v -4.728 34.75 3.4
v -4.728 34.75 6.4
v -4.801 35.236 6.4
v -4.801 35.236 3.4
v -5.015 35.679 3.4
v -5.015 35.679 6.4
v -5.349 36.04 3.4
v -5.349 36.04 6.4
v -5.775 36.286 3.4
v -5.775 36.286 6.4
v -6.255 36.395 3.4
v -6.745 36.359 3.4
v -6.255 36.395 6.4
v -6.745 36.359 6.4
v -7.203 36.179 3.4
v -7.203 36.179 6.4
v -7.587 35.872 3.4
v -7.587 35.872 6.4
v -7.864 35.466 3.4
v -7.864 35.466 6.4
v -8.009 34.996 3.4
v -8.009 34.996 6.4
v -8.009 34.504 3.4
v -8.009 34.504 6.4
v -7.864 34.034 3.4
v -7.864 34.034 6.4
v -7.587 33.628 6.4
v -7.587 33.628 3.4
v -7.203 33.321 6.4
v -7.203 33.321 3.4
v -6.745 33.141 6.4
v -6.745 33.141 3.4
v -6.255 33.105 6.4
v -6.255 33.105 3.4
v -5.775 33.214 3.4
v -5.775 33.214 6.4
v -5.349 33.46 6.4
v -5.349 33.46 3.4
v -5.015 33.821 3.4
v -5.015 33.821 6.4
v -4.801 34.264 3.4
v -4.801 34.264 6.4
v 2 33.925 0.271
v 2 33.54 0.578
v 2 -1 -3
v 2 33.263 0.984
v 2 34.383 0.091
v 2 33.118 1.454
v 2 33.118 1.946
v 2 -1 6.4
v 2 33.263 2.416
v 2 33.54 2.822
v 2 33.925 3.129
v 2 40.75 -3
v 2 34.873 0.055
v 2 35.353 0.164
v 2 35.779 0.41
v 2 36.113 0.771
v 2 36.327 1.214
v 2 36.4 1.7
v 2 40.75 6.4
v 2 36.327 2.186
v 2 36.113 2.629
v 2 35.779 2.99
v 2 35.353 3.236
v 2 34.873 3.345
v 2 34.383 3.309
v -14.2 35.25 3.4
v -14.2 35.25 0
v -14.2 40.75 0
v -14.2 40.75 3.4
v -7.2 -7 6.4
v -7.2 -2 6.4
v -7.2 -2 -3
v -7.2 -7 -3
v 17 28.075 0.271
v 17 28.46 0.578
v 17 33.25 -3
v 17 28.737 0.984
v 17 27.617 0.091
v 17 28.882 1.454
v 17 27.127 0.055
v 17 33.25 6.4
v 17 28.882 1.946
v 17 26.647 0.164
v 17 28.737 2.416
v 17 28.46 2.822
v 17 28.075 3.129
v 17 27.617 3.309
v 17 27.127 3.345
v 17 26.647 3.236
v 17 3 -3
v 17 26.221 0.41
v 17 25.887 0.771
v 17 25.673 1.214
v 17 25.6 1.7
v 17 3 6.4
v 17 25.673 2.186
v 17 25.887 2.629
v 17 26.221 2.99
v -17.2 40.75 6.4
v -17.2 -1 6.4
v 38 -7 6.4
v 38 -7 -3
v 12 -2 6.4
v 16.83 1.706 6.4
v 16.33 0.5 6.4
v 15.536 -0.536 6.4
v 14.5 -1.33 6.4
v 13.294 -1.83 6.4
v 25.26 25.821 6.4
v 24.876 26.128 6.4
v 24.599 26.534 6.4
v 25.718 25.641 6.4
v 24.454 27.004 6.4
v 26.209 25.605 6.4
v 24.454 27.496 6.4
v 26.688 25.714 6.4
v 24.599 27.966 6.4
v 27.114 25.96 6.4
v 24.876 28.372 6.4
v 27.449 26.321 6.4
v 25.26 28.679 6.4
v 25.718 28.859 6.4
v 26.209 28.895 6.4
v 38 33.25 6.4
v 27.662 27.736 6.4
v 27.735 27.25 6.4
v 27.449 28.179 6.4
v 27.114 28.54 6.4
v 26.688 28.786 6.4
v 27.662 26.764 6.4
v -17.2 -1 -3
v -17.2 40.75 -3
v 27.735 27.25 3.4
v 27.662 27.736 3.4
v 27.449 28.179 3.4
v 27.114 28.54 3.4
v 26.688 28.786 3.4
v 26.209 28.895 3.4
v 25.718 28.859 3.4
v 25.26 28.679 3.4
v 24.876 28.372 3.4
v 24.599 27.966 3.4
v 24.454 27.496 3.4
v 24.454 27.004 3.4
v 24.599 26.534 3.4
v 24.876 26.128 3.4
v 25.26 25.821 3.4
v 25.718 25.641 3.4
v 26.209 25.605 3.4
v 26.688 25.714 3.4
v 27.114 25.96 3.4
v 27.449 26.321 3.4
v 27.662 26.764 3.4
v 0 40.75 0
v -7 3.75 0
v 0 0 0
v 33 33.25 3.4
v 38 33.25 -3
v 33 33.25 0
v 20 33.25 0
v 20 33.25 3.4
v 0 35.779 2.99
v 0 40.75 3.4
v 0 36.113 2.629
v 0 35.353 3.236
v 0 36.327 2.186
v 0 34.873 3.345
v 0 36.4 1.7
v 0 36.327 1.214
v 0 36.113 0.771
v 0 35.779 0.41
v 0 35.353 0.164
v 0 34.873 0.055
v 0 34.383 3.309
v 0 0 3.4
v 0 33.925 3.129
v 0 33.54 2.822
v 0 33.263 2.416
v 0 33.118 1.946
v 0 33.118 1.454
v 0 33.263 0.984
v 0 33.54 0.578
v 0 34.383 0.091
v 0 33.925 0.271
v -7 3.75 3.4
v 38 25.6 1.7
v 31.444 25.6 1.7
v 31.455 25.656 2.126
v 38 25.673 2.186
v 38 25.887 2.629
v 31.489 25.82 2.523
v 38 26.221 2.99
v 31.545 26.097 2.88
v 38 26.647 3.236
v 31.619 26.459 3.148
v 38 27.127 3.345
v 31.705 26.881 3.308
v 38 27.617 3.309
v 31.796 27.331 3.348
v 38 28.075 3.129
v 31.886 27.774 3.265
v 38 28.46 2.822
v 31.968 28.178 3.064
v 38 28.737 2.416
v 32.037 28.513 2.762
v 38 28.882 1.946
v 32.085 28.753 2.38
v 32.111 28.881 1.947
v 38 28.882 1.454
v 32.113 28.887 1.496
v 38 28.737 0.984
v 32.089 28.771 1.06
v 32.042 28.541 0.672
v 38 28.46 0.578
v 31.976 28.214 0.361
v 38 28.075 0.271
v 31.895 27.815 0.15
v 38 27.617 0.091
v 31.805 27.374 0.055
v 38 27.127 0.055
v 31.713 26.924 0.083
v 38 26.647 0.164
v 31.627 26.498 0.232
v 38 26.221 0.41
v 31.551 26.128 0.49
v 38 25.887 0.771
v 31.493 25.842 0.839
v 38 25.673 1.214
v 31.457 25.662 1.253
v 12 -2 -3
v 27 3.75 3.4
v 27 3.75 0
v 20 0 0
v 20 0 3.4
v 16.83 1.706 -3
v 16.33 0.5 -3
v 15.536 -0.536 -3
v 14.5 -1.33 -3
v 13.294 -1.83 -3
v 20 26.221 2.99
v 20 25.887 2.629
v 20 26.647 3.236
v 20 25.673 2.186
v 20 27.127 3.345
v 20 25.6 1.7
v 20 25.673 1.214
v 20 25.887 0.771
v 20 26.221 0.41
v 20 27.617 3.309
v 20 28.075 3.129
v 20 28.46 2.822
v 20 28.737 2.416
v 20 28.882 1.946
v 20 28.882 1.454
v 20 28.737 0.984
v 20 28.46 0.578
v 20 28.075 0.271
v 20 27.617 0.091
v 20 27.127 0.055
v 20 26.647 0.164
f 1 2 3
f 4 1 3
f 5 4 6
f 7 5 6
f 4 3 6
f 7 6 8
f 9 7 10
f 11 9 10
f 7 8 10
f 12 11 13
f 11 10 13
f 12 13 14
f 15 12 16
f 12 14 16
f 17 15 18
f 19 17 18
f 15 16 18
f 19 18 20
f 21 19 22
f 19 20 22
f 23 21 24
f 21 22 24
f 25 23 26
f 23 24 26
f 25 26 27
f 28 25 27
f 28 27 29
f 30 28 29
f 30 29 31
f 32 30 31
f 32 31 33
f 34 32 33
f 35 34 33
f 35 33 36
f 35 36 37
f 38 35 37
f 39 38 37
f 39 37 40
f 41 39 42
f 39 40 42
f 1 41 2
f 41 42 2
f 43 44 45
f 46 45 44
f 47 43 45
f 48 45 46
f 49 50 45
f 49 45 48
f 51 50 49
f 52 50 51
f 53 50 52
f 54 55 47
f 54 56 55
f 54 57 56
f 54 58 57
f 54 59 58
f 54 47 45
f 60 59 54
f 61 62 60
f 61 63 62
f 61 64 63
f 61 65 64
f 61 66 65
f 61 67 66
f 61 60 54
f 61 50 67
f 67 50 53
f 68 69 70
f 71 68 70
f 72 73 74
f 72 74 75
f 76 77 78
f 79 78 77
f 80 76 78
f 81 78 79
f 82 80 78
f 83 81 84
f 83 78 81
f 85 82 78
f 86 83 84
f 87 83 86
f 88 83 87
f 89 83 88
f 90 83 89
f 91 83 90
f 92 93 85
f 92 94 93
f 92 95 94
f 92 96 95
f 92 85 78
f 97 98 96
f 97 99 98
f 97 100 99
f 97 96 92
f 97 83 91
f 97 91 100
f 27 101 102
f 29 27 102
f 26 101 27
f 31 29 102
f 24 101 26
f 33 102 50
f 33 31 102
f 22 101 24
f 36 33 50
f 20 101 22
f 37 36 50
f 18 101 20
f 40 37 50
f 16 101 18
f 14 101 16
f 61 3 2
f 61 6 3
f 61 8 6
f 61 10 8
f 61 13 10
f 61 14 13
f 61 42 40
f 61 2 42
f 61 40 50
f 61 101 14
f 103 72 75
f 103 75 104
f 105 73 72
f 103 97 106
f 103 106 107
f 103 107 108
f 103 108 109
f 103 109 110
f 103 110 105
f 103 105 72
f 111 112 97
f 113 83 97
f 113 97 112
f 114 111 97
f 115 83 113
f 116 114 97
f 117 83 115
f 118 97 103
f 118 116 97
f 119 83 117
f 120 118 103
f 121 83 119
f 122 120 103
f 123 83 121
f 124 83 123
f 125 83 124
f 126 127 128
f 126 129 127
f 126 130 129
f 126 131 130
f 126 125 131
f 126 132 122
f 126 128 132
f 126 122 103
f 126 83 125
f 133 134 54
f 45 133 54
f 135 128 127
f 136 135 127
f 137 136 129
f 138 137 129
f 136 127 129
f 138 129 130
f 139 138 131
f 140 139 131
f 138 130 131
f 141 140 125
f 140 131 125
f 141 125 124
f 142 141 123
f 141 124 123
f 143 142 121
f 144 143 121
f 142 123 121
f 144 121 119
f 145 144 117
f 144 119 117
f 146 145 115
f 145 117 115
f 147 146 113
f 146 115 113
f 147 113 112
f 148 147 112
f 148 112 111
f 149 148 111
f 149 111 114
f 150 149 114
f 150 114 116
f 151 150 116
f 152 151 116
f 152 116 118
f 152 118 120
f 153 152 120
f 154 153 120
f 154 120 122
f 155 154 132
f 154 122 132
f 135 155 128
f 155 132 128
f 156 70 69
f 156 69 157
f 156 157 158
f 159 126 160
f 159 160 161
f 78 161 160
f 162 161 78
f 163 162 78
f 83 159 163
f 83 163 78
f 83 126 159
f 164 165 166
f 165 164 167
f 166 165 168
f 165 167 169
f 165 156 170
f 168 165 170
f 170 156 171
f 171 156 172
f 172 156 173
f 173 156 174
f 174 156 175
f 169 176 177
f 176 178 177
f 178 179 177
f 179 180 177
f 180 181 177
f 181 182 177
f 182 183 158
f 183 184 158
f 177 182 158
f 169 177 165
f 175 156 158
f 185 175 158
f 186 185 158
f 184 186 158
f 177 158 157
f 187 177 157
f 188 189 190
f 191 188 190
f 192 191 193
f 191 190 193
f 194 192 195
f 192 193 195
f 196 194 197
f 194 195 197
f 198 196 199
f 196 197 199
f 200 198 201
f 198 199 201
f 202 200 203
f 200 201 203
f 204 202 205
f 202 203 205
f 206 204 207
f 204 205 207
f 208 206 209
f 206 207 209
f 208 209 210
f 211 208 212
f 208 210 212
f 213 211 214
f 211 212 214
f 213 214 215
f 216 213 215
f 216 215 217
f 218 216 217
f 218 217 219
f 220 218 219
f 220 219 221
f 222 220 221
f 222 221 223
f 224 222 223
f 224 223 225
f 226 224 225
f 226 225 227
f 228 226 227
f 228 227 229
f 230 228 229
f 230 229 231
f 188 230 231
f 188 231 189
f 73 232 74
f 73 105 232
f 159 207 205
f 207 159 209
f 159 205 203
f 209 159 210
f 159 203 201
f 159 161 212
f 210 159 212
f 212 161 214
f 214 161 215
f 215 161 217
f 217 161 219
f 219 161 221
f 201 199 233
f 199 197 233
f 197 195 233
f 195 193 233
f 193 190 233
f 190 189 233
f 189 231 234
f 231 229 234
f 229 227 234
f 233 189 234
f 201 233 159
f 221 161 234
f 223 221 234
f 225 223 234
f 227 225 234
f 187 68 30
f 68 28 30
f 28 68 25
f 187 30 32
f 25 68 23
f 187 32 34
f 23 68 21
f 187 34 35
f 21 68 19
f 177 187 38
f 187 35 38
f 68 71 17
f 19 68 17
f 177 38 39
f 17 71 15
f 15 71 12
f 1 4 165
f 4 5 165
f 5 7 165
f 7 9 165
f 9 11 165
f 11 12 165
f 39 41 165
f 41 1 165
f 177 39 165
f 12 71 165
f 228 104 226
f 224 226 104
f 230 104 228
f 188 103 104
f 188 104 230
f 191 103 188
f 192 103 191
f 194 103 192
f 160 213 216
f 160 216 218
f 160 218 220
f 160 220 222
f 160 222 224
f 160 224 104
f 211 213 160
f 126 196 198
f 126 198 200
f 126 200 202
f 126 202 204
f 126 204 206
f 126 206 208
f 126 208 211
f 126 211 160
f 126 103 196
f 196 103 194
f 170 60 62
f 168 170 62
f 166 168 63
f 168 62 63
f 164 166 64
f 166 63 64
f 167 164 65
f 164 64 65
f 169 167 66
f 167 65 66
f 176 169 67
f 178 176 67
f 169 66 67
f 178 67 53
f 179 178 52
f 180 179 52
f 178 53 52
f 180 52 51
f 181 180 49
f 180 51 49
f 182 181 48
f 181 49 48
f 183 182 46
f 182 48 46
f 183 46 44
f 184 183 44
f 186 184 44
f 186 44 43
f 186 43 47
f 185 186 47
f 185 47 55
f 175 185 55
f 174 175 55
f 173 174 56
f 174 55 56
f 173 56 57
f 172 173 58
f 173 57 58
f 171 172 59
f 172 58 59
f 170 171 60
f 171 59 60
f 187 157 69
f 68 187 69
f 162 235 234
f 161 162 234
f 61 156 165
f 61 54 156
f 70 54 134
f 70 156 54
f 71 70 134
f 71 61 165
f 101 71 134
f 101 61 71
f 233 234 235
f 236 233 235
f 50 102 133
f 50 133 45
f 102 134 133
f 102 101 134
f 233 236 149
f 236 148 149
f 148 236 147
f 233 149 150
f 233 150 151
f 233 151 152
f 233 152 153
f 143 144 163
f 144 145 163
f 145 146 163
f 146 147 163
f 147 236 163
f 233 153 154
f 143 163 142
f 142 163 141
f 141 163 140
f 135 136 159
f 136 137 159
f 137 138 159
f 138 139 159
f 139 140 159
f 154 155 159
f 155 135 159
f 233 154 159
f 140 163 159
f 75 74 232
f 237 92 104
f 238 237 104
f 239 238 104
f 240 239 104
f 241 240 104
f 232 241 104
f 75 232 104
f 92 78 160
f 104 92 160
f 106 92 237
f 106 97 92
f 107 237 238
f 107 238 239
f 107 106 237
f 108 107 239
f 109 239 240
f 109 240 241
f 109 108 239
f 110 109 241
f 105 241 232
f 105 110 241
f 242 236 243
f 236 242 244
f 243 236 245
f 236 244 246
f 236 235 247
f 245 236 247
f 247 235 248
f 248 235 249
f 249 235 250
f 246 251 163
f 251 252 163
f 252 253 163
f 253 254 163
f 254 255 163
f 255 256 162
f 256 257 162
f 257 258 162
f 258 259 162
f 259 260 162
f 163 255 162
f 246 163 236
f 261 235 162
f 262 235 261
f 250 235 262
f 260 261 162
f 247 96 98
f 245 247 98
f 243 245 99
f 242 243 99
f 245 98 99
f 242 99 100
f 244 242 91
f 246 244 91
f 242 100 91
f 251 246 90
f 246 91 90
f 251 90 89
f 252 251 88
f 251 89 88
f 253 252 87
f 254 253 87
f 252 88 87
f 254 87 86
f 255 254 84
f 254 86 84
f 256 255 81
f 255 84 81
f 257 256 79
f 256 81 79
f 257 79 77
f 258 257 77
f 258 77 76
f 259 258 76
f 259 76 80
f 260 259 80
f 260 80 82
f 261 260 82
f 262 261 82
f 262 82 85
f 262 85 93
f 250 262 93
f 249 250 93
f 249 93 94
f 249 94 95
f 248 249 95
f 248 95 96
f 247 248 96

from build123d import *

# Parameters (mm, degrees)
F1_DEPTH  = 3.4
F3_DEPTH  = 3
F4_DEPTH  = 3
F5_DEPTH  = 3
F6_R      = 1.65
F7_DEPTH  = 3
F8_R      = 1.65
F9_DEPTH  = 2
F10_R     = 1.65
F11_DEPTH = 21.001
F12_R     = 5


# Not quite as in the source:
# - a feature names something its author has since deleted; it is built from what else it names


with BuildPart() as f1:
    # F0 (on Top) → F1 (new body)
    with BuildSketch(Plane.XY):
        Polygon((-17.2, 0), (0, 0), (-7, 3.75), (-14.2, 35.25), (-14.2, 40.75), (-17.2, 40.75), align=None)
        Polygon((0, 40.75), (0, 0), (-17.2, 0), (-17.2, -1), (2, -1), (2, 0), (2, 40.75), align=None)
    extrude(amount=F1_DEPTH)

    # F2 (on face) → F3 (join)
    with BuildSketch(Plane.XY.offset(3.4)):
        Polygon((0, 40.75), (0, 0), (-7, 3.75), (-14.2, 35.25), (-14.2, 40.75), (-17.2, 40.75), (-17.2, -1), (2, -1), (2, 0), (2, 40.75), align=None)
        Polygon((-7, 3.75), (0, 0), (0, 40.75), (-14.2, 40.75), (-14.2, 35.25), align=None)
    extrude(amount=F3_DEPTH)

    # F0 (on Top) → F4 (join)
    with BuildSketch(Plane.XY):
        Polygon((-17.2, 0), (0, 0), (-7, 3.75), (-14.2, 35.25), (-14.2, 40.75), (-17.2, 40.75), align=None)
        Polygon((-7, 3.75), (0, 0), (0, 40.75), (-14.2, 40.75), (-14.2, 35.25), align=None)
        Polygon((0, 40.75), (0, 0), (-17.2, 0), (-17.2, -1), (2, -1), (2, 0), (2, 40.75), align=None)
    extrude(amount=-F4_DEPTH)


with BuildPart() as f1b:
    # F0 (on Top) → F1, piece 2 (new body)
    with BuildSketch(Plane.XY):
        Polygon((20, 33.25), (17, 33.25), (17, 0), (17, -2), (-7.2, -2), (-7.2, -7), (38, -7), (38, 33.25), (33, 33.25), (27, 3.75), (20, 0), align=None)
    extrude(amount=F1_DEPTH)

    # F2 (on face) → F3, piece 2 (join)
    with BuildSketch(Plane.XY.offset(3.4)):
        Polygon((27, 3.75), (20, 0), (20, 33.25), (17, 33.25), (17, -2), (-7.2, -2), (-7.2, -7), (38, -7), (38, 33.25), (33, 33.25), align=None)
        Polygon((20, 33.25), (20, 0), (27, 3.75), (33, 33.25), align=None)
    extrude(amount=F3_DEPTH)

    # F0 (on Top) → F5 (join)
    with BuildSketch(Plane.XY):
        Polygon((20, 33.25), (17, 33.25), (17, 0), (17, -2), (-7.2, -2), (-7.2, -7), (38, -7), (38, 33.25), (33, 33.25), (27, 3.75), (20, 0), align=None)
        Polygon((33, 33.25), (20, 33.25), (20, 0), (27, 3.75), align=None)
    extrude(amount=-F5_DEPTH)


with BuildPart() as f7_tool:
    # F6 (on face) → F7 (new body, through all)
    with BuildSketch(Plane.XY.offset(6.4)):
        with Locations((-6.3778683543, 34.75)):
            Circle(F6_R)
        with Locations((26.0853748769, 27.25)):
            Circle(F6_R)
    extrude(amount=-F7_DEPTH)


with BuildPart() as f1_1:
    add(f1.part)

    # F7: cut by f7_tool
    add(f7_tool.part, mode=Mode.SUBTRACT)

    # F8 (on face) → F9 (cut, through all)
    with BuildSketch(Plane.YZ.offset(2)):
        with Locations((34.75, 1.7)):
            Circle(F8_R)
    extrude(amount=-F9_DEPTH, mode=Mode.SUBTRACT)


with BuildPart() as f1b_1:
    add(f1b.part)

    # F7: cut by f7_tool
    add(f7_tool.part, mode=Mode.SUBTRACT)

    # F10 (on face) → F11 (cut, through all)
    with BuildSketch(Plane(origin=(17, 0, 0), x_dir=(0, -1, 0), z_dir=(-1, 0, 0))):
        with Locations((-27.25, 1.7)):
            Circle(F10_R)
    extrude(amount=-F11_DEPTH, mode=Mode.SUBTRACT)

    # F12
    f12_edges = [f1b_1.edges().sort_by_distance(p)[0] for p in [
        (17, -2, 1.7),
    ]]
    fillet(f12_edges, radius=F12_R)


solid = Compound([f1_1.part, f1b_1.part])
